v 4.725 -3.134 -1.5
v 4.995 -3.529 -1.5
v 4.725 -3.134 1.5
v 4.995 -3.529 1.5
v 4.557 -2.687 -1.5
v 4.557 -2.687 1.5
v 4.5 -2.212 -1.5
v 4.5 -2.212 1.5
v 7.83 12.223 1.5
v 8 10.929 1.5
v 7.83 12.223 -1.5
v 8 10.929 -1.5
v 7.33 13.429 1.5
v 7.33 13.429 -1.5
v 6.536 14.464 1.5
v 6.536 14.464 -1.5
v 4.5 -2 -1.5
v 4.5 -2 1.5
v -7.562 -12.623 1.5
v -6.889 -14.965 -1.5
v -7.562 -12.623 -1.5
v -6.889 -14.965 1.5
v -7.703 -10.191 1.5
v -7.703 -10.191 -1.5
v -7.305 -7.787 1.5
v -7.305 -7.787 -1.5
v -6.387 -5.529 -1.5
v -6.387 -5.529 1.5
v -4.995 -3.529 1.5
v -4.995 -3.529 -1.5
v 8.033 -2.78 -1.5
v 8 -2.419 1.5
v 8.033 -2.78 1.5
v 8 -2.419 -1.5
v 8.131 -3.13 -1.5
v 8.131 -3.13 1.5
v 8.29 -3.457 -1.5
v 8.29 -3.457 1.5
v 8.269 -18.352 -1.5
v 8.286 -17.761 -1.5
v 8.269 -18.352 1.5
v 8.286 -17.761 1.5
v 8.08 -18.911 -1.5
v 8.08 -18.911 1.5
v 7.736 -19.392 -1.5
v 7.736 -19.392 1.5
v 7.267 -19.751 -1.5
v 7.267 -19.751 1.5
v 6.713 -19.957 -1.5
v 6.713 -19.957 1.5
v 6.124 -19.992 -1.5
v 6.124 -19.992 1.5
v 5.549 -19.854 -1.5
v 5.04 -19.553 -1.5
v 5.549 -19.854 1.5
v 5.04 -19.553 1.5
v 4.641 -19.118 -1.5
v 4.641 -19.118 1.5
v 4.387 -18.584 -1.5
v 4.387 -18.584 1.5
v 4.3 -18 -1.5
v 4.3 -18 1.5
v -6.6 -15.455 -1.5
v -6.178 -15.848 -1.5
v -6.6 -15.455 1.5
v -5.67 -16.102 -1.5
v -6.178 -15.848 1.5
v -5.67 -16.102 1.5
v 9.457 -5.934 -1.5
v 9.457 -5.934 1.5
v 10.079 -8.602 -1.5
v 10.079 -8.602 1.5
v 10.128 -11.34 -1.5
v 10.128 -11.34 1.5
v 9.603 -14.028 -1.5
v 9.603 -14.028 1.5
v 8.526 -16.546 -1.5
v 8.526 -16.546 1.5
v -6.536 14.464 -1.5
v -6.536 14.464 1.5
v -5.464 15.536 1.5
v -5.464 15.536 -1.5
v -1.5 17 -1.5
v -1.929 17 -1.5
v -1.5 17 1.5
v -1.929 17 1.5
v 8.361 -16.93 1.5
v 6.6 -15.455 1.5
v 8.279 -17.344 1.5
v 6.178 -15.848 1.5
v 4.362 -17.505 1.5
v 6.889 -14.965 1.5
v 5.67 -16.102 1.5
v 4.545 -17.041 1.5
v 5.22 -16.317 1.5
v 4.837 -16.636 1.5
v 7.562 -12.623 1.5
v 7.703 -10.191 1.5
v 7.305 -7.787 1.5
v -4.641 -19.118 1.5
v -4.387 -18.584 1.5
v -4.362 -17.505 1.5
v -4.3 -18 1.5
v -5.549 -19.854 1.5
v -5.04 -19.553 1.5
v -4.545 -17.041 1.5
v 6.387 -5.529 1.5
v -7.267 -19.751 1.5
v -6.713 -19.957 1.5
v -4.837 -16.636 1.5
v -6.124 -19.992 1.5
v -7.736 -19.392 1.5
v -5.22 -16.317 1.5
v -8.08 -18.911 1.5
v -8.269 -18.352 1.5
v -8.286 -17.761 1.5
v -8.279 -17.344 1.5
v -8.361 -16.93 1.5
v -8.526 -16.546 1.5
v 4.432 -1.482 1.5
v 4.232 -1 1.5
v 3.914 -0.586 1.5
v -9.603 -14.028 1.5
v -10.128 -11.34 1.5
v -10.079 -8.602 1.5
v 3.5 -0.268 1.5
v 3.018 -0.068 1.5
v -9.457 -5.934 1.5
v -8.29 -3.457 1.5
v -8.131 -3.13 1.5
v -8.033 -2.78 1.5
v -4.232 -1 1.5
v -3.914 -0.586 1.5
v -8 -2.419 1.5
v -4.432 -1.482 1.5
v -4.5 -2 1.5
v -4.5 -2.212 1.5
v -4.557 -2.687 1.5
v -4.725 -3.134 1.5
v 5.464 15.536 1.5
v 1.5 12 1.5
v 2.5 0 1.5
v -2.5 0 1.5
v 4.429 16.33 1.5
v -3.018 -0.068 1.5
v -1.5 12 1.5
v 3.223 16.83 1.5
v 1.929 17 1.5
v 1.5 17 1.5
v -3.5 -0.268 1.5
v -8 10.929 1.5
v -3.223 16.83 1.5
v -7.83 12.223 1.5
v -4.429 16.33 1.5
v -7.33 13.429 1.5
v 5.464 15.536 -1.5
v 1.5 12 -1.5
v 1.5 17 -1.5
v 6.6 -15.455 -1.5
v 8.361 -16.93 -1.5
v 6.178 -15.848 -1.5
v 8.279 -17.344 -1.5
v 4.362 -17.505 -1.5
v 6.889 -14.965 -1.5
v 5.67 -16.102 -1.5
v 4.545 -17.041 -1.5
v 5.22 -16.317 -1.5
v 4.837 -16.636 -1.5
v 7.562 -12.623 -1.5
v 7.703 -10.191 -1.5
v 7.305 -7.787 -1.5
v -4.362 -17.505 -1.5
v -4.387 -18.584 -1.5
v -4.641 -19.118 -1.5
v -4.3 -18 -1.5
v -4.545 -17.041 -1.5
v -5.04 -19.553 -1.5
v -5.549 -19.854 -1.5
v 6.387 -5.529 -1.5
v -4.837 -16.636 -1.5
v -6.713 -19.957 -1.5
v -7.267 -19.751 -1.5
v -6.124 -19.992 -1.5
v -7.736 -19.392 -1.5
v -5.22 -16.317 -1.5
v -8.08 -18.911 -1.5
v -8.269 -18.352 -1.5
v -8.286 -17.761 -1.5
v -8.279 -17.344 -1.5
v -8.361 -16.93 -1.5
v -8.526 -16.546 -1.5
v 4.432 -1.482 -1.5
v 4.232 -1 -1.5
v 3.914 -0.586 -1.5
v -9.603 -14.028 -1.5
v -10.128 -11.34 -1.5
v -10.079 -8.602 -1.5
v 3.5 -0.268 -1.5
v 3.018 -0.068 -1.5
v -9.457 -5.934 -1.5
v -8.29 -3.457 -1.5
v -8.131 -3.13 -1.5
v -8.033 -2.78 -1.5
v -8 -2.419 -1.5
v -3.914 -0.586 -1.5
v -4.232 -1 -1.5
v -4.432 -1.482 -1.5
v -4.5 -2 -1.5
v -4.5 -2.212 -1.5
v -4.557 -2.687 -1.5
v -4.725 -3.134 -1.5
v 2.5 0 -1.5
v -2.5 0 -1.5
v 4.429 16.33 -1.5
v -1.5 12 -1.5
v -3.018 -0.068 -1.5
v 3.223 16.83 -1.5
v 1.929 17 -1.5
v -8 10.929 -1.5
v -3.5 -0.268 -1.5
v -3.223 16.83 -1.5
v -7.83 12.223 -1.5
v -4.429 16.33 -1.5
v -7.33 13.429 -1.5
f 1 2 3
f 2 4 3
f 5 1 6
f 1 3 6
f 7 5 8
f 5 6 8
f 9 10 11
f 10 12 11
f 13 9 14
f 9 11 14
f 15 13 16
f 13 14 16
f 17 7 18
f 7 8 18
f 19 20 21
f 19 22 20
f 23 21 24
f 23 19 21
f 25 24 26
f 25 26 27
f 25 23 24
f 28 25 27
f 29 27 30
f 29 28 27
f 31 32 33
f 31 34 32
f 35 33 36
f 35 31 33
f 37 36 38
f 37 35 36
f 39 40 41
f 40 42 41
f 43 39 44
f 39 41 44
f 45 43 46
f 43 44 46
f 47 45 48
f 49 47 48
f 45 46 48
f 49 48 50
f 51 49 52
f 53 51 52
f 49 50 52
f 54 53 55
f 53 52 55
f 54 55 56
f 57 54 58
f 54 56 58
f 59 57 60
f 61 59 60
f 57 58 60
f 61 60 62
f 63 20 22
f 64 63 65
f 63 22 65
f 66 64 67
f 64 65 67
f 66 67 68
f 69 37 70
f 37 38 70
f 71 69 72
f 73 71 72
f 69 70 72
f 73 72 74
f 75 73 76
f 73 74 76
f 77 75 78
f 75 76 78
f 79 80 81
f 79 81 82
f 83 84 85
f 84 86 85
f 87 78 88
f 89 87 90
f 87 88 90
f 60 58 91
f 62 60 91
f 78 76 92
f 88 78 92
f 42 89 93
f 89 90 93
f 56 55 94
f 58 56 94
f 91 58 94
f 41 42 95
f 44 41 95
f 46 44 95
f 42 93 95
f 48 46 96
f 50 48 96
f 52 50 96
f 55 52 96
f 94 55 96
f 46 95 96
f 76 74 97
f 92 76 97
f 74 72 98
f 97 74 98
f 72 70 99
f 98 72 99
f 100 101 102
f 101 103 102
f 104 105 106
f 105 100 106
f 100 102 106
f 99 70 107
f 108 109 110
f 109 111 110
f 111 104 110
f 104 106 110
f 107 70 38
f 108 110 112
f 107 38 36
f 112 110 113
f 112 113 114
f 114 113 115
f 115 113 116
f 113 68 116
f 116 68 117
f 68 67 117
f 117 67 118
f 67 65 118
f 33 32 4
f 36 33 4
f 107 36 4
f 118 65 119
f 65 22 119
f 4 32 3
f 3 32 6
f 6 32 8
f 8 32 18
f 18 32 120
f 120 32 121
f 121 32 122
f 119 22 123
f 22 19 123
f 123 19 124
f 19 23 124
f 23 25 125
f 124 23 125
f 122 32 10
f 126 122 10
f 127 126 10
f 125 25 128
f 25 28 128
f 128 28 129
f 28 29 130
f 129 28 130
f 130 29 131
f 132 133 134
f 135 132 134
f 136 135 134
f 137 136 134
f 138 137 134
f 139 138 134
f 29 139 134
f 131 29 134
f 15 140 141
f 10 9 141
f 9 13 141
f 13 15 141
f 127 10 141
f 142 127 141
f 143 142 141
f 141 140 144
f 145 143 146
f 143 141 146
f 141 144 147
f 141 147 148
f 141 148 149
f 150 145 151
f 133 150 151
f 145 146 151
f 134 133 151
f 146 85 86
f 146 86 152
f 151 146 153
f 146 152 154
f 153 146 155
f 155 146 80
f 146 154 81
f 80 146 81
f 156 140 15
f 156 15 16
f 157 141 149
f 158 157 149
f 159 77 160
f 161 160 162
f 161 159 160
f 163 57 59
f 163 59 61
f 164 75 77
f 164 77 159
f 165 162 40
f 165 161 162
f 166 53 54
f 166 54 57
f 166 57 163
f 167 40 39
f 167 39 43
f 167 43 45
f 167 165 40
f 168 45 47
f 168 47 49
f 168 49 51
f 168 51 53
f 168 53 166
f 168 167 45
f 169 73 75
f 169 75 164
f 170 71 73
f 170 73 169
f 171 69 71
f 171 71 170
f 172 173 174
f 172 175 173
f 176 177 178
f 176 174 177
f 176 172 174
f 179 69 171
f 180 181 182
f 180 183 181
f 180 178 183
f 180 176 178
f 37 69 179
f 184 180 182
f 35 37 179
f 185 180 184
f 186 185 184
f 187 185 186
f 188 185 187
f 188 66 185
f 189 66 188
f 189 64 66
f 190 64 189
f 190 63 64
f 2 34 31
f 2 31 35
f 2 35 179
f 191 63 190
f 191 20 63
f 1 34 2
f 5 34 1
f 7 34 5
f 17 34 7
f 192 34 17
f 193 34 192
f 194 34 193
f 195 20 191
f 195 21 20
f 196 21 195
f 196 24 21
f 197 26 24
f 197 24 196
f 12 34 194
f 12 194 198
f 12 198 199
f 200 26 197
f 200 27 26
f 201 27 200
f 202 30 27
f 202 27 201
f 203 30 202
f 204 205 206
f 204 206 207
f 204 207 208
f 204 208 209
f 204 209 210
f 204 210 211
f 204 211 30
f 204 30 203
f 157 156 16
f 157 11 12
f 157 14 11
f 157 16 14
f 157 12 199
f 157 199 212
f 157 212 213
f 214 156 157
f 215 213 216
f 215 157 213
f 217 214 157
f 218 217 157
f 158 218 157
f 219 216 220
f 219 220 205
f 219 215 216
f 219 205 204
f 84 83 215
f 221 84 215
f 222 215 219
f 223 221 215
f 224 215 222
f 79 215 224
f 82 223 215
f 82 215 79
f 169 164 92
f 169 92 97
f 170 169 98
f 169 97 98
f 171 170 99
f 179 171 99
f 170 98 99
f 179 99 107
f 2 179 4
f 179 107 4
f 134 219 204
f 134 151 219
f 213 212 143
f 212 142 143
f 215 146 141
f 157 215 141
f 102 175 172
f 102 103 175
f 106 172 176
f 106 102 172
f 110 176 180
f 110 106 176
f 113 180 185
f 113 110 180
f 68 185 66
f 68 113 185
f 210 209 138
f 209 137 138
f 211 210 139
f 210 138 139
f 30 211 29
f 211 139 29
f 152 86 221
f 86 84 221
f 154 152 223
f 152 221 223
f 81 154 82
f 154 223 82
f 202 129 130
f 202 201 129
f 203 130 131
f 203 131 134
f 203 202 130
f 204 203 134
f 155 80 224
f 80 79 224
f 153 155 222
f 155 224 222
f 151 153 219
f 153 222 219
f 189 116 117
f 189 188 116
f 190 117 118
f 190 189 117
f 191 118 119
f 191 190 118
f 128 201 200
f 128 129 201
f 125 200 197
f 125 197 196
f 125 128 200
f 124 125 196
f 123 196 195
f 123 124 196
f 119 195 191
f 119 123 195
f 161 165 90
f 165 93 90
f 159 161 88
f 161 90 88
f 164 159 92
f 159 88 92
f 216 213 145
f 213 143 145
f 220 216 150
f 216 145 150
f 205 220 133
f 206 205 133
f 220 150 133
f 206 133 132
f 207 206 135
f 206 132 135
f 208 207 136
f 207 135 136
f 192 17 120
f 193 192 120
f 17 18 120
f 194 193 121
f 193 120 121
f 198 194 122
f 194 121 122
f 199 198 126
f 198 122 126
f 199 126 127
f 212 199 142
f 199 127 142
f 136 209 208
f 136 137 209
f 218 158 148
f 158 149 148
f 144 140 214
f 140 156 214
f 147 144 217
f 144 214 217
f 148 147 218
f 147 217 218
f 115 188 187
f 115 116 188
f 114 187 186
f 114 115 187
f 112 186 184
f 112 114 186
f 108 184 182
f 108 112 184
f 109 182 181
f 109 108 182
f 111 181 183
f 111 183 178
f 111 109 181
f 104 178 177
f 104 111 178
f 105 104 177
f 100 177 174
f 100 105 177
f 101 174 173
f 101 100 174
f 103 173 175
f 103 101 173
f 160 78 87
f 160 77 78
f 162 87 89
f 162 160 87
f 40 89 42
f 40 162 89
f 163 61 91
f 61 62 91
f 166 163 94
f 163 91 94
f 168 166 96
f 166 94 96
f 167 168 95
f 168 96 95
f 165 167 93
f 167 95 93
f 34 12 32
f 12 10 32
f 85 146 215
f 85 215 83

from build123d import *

# Parameters (mm, degrees)
F2_DEPTH = 1.5
F5_W     = 3
F5_H     = 5
F6_DEPTH = 25
F7_SIZE  = 4
F8_R     = 5
F9_R     = 2


with BuildPart() as f2:
    # F1 (on Top) → F2 (new body, symmetric)
    with BuildSketch(Plane.XY):
        with BuildLine():
            ThreePointArc((25.939839122, -44.6497348995), (25.3779596461, -43.9442064652), (24.8663520645, -43.2014167241))
            ThreePointArc((24.8663520645, -43.2014167241), (26.2921371989, -45.9579703612), (28.7, -44))
            ThreePointArc((28.7, -44), (28.0793670217, -42.5517781181), (26.6026533807, -42.0023704959))
            ThreePointArc((26.6026533807, -42.0023704959), (27.0242100762, -42.7170517529), (27.4984385882, -43.3979237417))
            ThreePointArc((27.4984385882, -43.3979237417), (27.6482717407, -43.6825402295), (27.7, -44))
            ThreePointArc((27.7, -44), (27.0462940384, -44.9381260251), (25.939839122, -44.6497348995))
        make_face()
        with BuildLine():
            ThreePointArc((27.4984385882, -43.3979237417), (26.0738018768, -43.2203360272), (25.939839122, -44.6497348995))
            ThreePointArc((25.939839122, -44.6497348995), (27.0462940384, -44.9381260251), (27.7, -44))
            ThreePointArc((27.7, -44), (27.6482717407, -43.6825402295), (27.4984385882, -43.3979237417))
        make_face()
        with BuildLine():
            ThreePointArc((26.6026533807, -42.0023704959), (25.5635084879, -42.3542822104), (24.8663520645, -43.2014167241))
            ThreePointArc((24.8663520645, -43.2014167241), (25.3779596461, -43.9442064652), (25.939839122, -44.6497348995))
            ThreePointArc((25.939839122, -44.6497348995), (26.0738018768, -43.2203360272), (27.4984385882, -43.3979237417))
            ThreePointArc((27.4984385882, -43.3979237417), (27.0242100762, -42.7170517529), (26.6026533807, -42.0023704959))
        make_face()
        with BuildLine():
            Line((28.5, -29), (25, -29))
            ThreePointArc((25, -29), (22.8225061684, -36.0808450853), (24.8663520645, -43.2014167241))
            ThreePointArc((24.8663520645, -43.2014167241), (25.5635084879, -42.3542822104), (26.6026533807, -42.0023704959))
            ThreePointArc((26.6026533807, -42.0023704959), (25.3965398825, -35.1867520093), (28.5, -29))
        make_face()
        Polygon((33, -9), (25, -9), (25, -29), (28.5, -29), (28.5, -26), (33, -26), align=None)
    extrude(amount=F2_DEPTH, both=True)


with BuildPart() as f2_1:
    # F3: moved
    add(f2.part.moved(Location((-33, 26, 0))))

    # F4: F2 across plane


with BuildPart() as f2_2:
    add(f2_1.part)
    add(f2_1.part.mirror(Plane.YZ))

    # F5 (on face) → F6 (cut)
    with BuildSketch(Plane.XY.offset(1.5)):
        with Locations((0, 14.5)):
            Rectangle(F5_W, F5_H)
    extrude(amount=-F6_DEPTH, mode=Mode.SUBTRACT)

    # F7
    f7_edges = [f2_2.edges().sort_by_distance(p)[0] for p in [
        (-8, 17, 0),
        (8, 17, 0),
    ]]
    chamfer(f7_edges, length=F7_SIZE)

    # F8
    f8_edges = [f2_2.edges().sort_by_distance(p)[0] for p in [
        (-8, 13, 0),
        (-4, 17, 0),
        (4, 17, 0),
        (8, 13, 0),
    ]]
    fillet(f8_edges, radius=F8_R)

    # F9
    f9_edges = [f2_2.edges().sort_by_distance(p)[0] for p in [
        (-8, -3, 0),
        (-4.5, -3, 0),
        (4.5, -3, 0),
        (8, -3, 0),
        (-4.5, 0, 0),
        (4.5, 0, 0),
        (-8.133648, -17.201417, 0),
        (-6.397347, -16.00237, 0),
        (8.133648, -17.201417, 0),
        (6.397347, -16.00237, 0),
    ]]
    fillet(f9_edges, radius=F9_R)


solid = f2_2.part
